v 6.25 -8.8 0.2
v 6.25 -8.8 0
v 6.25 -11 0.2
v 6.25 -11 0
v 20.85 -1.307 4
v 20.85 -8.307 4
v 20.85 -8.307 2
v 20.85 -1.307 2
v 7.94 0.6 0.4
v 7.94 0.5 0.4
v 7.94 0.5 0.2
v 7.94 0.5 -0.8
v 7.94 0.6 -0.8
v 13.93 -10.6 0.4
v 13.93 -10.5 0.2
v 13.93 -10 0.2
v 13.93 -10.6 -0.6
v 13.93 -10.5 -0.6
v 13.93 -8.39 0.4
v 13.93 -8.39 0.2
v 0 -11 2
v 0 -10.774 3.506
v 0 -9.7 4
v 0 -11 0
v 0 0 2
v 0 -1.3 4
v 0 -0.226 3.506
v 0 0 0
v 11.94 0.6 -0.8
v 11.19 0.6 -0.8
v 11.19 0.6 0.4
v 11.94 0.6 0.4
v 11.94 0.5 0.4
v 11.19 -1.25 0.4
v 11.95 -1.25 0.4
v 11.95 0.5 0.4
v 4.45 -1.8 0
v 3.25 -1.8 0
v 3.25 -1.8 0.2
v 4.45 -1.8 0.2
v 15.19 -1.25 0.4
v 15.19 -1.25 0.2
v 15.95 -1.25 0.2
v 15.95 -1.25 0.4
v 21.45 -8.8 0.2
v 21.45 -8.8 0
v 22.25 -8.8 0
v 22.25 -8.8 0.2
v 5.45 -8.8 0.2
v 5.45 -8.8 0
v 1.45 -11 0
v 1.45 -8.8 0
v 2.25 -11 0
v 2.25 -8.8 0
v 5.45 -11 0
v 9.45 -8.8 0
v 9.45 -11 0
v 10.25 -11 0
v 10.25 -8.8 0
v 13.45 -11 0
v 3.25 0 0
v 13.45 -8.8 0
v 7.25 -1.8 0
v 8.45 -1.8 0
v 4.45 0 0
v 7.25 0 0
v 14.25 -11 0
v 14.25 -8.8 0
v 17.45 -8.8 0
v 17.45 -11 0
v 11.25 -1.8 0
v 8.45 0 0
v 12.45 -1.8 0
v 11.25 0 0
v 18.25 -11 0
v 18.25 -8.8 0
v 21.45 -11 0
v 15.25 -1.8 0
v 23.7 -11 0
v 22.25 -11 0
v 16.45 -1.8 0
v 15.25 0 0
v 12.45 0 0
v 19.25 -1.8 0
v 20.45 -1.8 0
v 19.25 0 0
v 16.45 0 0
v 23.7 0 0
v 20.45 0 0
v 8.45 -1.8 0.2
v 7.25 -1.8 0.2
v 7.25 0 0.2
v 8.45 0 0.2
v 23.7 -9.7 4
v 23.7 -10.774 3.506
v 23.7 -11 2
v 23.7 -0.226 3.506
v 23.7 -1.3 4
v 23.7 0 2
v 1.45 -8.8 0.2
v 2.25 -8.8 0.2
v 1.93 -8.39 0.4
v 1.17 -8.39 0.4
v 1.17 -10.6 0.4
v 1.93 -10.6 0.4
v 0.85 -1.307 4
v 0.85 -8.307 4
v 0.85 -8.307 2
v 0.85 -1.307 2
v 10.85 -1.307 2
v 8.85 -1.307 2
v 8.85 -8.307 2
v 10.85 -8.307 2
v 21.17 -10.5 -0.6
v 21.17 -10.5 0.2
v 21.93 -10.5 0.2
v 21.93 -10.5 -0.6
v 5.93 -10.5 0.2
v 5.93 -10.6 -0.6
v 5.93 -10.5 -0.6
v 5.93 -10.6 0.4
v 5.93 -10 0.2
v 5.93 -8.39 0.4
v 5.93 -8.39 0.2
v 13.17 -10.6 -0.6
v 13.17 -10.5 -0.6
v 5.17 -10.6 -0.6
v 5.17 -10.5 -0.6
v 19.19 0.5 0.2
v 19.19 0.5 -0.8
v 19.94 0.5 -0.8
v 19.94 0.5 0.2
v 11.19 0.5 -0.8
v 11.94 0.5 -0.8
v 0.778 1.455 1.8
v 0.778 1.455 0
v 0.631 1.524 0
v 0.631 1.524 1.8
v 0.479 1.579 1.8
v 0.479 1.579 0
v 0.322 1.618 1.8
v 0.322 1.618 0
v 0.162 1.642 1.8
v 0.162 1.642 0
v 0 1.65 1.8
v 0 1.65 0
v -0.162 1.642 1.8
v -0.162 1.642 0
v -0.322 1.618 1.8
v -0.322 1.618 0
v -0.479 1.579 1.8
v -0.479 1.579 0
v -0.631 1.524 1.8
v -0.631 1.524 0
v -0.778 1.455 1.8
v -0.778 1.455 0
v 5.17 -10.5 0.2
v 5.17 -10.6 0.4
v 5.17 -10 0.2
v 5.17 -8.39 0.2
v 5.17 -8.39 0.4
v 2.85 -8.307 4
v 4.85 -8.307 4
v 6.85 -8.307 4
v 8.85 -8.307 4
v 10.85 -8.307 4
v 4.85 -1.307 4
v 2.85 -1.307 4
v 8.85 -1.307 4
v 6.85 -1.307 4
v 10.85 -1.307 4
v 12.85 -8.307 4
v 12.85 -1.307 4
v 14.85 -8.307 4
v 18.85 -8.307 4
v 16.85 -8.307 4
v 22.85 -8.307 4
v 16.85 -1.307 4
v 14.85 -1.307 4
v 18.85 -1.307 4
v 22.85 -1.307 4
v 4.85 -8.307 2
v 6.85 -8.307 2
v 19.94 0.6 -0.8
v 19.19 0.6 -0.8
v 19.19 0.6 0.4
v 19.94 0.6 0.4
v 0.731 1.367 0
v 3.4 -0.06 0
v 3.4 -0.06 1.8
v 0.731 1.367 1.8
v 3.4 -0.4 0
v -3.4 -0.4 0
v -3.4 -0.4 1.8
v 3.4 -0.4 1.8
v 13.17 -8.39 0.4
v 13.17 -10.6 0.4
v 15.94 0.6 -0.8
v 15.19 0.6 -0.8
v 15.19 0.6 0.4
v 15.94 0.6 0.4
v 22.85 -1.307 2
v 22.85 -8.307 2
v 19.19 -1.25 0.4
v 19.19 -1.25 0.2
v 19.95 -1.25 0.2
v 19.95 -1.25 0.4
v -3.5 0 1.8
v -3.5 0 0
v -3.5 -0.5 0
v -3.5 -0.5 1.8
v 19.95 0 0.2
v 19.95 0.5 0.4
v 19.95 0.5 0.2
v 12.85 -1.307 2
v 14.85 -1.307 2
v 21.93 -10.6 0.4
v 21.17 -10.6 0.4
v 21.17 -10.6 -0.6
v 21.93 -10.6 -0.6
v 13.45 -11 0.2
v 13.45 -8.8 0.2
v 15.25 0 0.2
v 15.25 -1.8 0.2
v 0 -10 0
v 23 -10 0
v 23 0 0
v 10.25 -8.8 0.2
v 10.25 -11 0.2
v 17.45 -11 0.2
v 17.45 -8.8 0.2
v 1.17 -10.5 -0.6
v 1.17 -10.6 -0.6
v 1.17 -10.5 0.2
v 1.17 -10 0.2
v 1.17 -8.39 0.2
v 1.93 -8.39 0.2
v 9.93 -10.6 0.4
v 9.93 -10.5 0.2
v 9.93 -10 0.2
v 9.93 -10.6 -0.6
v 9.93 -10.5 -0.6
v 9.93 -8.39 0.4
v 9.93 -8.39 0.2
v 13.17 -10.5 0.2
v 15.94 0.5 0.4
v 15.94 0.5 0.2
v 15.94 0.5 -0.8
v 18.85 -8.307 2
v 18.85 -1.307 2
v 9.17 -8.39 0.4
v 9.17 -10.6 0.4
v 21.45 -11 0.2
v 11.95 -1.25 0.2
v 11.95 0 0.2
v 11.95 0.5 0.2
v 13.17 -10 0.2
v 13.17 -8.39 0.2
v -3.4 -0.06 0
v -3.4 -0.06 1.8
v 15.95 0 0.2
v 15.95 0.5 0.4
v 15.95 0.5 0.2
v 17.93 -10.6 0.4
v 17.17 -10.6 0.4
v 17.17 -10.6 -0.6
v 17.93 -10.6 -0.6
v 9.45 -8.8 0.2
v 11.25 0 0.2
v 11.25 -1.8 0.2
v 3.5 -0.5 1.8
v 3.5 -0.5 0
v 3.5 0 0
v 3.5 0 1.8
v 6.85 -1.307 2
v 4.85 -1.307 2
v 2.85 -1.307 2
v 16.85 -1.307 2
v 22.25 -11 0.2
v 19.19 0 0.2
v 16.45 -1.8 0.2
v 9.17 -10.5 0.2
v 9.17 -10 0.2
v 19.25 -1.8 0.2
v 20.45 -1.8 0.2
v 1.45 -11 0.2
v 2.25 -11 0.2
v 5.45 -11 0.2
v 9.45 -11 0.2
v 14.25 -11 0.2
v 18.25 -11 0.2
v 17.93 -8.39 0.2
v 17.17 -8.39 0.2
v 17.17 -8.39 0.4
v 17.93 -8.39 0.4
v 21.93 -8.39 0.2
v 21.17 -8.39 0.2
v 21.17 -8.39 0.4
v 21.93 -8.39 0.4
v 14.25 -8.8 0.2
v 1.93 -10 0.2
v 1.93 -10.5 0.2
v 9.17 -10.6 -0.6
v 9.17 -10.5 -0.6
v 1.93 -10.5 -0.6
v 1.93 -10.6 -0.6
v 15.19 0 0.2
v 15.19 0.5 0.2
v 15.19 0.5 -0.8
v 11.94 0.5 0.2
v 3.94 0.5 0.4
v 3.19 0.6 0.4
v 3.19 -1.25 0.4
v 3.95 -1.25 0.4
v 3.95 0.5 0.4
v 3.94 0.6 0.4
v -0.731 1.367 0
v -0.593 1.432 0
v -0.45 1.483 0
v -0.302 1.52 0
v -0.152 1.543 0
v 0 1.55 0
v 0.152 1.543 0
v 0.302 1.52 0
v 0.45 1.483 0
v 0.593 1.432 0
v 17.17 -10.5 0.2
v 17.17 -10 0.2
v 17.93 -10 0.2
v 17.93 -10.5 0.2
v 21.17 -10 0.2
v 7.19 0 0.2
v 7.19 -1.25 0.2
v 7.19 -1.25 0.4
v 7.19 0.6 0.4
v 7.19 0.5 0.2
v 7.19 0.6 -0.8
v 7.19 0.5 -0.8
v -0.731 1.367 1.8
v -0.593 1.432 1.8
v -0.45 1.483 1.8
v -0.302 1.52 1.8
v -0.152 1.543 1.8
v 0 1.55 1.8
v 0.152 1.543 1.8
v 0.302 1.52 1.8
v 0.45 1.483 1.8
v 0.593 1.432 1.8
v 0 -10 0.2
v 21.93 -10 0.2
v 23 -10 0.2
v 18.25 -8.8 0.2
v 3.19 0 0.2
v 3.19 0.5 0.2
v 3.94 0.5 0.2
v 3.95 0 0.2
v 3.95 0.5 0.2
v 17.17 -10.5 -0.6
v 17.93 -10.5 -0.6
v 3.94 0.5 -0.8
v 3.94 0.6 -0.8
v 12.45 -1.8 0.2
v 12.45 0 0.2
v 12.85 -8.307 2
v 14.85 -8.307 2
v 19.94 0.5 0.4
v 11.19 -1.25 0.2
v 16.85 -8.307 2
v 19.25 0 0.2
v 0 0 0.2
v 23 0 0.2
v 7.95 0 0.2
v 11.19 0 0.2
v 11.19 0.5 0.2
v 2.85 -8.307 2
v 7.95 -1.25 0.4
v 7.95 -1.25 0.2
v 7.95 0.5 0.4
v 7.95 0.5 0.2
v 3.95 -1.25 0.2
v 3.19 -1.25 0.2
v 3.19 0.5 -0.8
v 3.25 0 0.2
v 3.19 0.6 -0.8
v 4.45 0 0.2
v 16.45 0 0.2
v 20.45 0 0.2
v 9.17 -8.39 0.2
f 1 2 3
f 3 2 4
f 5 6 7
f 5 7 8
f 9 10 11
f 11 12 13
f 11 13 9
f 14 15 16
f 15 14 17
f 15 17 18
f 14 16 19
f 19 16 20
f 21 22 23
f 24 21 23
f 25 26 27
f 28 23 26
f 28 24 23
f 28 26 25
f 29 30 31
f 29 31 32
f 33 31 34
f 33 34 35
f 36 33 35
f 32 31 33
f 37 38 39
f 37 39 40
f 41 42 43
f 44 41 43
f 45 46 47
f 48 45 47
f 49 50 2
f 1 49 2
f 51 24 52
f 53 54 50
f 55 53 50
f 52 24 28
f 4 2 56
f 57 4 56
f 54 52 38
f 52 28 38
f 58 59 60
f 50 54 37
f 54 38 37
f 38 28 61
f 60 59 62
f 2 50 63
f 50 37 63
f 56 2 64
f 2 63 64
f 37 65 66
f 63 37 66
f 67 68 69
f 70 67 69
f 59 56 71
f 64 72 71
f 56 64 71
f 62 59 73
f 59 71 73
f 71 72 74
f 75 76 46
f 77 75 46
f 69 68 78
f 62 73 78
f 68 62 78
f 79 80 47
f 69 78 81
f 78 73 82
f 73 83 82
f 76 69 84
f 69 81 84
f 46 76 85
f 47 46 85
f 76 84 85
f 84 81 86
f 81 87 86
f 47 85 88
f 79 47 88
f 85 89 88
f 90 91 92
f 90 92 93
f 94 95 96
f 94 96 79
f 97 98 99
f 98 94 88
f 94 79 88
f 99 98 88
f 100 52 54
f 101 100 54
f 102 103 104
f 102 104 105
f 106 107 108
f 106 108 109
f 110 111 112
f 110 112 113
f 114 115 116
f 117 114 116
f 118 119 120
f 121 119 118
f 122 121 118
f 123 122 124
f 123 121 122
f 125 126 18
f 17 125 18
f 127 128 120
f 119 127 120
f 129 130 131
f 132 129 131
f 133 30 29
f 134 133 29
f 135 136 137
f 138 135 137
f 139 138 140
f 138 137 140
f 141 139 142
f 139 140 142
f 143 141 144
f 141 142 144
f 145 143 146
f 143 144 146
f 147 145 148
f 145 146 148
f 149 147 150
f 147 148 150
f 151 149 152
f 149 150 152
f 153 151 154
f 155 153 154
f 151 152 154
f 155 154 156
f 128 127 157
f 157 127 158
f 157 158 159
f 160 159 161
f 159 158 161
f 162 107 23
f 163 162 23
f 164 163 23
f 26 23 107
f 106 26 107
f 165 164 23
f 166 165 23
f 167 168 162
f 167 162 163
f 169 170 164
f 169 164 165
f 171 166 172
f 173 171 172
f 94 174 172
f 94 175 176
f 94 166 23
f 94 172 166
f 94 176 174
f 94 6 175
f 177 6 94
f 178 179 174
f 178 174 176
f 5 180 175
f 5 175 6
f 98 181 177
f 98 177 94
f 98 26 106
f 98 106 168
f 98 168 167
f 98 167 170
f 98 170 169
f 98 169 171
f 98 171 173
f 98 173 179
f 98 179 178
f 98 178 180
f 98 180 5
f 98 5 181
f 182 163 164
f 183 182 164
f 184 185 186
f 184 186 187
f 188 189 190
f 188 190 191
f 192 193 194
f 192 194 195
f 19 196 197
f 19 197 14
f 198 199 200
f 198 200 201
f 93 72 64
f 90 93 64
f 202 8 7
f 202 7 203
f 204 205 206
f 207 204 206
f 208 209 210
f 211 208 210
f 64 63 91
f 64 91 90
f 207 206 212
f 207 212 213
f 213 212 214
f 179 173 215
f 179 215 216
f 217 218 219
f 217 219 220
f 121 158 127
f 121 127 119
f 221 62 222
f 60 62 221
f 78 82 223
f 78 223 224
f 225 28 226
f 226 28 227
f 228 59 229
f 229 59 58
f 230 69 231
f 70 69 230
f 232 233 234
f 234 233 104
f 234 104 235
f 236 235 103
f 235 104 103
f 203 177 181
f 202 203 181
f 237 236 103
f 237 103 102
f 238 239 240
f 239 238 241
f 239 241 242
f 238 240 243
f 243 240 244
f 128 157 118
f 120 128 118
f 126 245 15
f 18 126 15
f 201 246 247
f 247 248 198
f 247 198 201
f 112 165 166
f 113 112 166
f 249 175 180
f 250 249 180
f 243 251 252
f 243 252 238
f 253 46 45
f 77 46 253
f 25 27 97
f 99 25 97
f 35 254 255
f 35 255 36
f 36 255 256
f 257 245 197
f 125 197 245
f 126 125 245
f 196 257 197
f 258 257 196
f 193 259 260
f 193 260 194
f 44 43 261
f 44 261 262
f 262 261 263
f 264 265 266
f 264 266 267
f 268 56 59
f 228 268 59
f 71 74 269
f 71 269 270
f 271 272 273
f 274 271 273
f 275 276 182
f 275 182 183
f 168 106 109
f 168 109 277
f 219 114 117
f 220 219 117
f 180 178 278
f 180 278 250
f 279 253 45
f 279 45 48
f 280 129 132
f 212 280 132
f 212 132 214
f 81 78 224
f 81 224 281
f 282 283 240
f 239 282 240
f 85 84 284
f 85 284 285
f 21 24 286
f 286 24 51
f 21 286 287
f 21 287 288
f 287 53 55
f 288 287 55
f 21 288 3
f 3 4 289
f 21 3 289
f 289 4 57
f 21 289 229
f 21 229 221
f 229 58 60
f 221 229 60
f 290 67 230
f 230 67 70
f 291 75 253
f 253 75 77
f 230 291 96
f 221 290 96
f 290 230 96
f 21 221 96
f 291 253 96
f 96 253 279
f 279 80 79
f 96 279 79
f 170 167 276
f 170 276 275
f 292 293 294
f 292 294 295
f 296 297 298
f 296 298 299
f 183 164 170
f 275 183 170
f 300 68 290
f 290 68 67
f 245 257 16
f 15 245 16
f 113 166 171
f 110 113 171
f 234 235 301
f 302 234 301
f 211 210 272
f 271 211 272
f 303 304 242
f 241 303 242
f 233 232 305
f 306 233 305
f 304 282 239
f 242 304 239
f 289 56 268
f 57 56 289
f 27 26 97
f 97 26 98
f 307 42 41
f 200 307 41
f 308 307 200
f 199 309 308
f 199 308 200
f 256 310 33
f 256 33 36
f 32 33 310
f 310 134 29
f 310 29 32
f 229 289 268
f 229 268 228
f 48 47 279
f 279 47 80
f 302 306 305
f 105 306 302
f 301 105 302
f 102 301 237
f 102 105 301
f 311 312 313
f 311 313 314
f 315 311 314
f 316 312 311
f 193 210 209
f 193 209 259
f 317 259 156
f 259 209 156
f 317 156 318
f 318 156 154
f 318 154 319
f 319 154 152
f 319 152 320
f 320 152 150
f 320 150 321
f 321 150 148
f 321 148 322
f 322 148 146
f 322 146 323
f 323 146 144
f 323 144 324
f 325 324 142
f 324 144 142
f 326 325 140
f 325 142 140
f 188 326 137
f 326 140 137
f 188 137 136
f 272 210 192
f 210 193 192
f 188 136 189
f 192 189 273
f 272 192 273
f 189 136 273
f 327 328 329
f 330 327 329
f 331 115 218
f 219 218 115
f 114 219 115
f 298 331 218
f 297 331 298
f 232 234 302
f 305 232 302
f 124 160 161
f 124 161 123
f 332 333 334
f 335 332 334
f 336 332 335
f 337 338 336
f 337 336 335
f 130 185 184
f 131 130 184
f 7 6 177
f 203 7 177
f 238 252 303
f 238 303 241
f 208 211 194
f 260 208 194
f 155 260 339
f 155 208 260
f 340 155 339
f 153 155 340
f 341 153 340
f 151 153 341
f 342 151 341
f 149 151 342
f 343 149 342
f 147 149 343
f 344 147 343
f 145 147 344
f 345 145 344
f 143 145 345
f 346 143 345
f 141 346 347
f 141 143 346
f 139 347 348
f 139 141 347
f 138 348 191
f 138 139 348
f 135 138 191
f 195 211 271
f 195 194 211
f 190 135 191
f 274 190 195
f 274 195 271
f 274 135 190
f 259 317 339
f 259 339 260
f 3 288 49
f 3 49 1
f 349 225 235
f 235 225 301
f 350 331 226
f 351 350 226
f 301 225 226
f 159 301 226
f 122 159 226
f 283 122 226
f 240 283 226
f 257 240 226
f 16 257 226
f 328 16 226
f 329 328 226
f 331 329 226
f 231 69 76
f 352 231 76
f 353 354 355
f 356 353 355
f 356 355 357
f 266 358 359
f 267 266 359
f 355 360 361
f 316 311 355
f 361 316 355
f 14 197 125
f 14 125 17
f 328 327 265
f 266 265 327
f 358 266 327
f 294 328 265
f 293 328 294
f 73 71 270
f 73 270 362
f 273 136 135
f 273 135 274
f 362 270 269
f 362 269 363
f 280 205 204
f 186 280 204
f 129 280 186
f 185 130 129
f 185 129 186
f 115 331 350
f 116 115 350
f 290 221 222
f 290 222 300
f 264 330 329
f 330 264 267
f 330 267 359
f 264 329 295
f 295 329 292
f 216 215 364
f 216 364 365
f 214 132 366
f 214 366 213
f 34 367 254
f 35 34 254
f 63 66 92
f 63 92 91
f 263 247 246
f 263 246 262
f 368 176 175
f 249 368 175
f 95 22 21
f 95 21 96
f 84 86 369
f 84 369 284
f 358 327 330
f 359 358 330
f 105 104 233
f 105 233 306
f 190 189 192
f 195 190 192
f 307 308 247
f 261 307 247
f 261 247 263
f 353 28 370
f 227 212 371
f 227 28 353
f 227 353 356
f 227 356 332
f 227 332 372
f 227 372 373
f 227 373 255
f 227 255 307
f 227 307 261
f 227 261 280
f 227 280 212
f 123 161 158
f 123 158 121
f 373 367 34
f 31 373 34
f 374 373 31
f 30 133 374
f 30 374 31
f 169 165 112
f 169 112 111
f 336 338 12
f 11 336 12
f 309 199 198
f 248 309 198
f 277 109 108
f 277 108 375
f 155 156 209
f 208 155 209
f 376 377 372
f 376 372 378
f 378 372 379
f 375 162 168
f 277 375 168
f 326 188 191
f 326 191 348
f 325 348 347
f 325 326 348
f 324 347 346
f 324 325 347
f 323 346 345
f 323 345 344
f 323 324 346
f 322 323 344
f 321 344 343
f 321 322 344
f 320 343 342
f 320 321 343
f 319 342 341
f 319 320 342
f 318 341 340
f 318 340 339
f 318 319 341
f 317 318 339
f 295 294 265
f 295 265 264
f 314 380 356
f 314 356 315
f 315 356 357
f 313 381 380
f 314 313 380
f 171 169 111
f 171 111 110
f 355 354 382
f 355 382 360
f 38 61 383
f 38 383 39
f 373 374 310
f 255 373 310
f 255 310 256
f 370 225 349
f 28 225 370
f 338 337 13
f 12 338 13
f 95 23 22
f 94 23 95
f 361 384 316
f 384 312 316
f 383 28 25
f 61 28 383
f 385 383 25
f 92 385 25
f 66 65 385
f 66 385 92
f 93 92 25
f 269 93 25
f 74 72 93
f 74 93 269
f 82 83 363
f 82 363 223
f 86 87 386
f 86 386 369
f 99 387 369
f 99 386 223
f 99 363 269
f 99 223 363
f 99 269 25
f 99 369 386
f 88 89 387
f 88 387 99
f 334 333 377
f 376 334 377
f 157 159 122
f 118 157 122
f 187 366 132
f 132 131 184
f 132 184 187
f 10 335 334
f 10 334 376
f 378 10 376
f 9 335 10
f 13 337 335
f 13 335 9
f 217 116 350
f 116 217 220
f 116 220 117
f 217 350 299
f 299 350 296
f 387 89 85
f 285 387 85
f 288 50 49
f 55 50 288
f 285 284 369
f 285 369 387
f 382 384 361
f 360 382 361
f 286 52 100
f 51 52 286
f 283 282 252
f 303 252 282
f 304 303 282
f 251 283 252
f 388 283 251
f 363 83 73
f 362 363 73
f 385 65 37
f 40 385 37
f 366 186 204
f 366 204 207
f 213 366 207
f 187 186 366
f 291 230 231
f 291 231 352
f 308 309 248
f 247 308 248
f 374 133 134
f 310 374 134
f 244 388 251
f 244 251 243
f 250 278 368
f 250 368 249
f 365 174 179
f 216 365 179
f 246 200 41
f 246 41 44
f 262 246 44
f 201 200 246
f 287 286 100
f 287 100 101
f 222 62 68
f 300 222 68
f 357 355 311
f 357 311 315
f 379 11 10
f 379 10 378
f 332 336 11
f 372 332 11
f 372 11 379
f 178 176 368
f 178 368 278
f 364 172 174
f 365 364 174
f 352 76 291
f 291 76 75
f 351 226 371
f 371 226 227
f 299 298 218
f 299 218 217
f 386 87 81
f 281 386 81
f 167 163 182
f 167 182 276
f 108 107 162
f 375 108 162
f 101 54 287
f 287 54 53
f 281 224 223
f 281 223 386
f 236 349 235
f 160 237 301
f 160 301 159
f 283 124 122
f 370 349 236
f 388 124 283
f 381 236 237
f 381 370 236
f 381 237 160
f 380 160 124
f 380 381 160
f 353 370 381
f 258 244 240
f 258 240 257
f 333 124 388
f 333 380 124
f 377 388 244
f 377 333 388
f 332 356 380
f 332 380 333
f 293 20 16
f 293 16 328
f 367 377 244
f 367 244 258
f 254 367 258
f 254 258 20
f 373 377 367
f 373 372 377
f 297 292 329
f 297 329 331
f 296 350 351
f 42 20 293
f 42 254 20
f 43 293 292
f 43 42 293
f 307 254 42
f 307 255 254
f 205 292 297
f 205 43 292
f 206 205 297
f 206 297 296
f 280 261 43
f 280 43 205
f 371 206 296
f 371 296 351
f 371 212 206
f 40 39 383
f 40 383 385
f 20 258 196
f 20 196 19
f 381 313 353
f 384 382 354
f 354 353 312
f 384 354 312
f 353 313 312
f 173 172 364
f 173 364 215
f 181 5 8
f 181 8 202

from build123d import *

# Parameters (mm, degrees)
SKETCH_W               = 23.7
SKETCH_H               = 11
PAD_DEPTH              = 4
CHAMFER_1_SIZE2        = 0.3
CHAMFER_1_SIZE         = 2
CHAMFER_2_SIZE2        = 0.3
CHAMFER_2_SIZE         = 2
CHAMFER001_1_SIZE2     = 1
CHAMFER001_1_SIZE      = 0.5
CHAMFER001_2_SIZE2     = 1
CHAMFER001_2_SIZE      = 0.5
SKETCH001_W            = 2
SKETCH001_H            = 7
POCKET_DEPTH           = 2
LINEARPATTERN_COUNT    = 6
LINEARPATTERN_PITCH    = 4
SKETCH002_W            = 0.8
SKETCH002_H            = 2.2
POCKET001_DEPTH        = 0.2
LINEARPATTERN001_COUNT = 6
LINEARPATTERN001_PITCH = 4
SKETCH003_W            = 1.2
SKETCH003_H            = 1.8
POCKET002_DEPTH        = 0.2
LINEARPATTERN002_COUNT = 5
LINEARPATTERN002_PITCH = 4
PAD001_DEPTH           = 1.8
SKETCH005_W            = 23
SKETCH005_H            = 10
PAD002_DEPTH           = 0.2
SKETCH006_W            = 0.76
SKETCH006_H            = 2.11
PAD003_DEPTH           = 0.2
LINEARPATTERN003_COUNT = 6
LINEARPATTERN003_PITCH = 4
SKETCH007_W            = 0.76
SKETCH007_H            = 1.75
PAD004_DEPTH           = 0.2
LINEARPATTERN004_COUNT = 5
LINEARPATTERN004_PITCH = 4
SKETCH008_W            = 0.75
SKETCH008_H            = 0.1
PAD005_DEPTH           = 0.2
PAD005_DEPTH_BACK      = 1
LINEARPATTERN005_COUNT = 5
LINEARPATTERN005_PITCH = 4
SKETCH009_W            = 0.76
SKETCH009_H            = 0.1
PAD006_DEPTH           = 1
LINEARPATTERN006_COUNT = 6
LINEARPATTERN006_PITCH = 4


with BuildPart() as body:
    # Sketch → Pad (new body)
    with BuildSketch(Plane.XY):
        with Locations((11.85, -5.5)):
            Rectangle(SKETCH_W, SKETCH_H)
    extrude(amount=PAD_DEPTH)

    # Chamfer 1
    chamfer_1_edges = [body.edges().sort_by_distance(p)[0] for p in [
        (11.85, -11, 4),
    ]]
    chamfer_1_side = body.faces().sort_by_distance((11.85, -11, 2))[0]
    chamfer(chamfer_1_edges, length=CHAMFER_1_SIZE, length2=CHAMFER_1_SIZE2, reference=chamfer_1_side)

    # Chamfer 2
    chamfer_2_edges = [body.edges().sort_by_distance(p)[0] for p in [
        (11.85, 0, 4),
    ]]
    chamfer_2_side = body.faces().sort_by_distance((11.85, 0, 2))[0]
    chamfer(chamfer_2_edges, length=CHAMFER_2_SIZE, length2=CHAMFER_2_SIZE2, reference=chamfer_2_side)

    # Chamfer001 1
    chamfer001_1_edges = [body.edges().sort_by_distance(p)[0] for p in [
        (11.85, -10.7, 4),
    ]]
    chamfer001_1_side = body.faces().sort_by_distance((11.85, -10.85, 3))[0]
    chamfer(chamfer001_1_edges, length=CHAMFER001_1_SIZE, length2=CHAMFER001_1_SIZE2, reference=chamfer001_1_side)

    # Chamfer001 2
    chamfer001_2_edges = [body.edges().sort_by_distance(p)[0] for p in [
        (11.85, -0.3, 4),
    ]]
    chamfer001_2_side = body.faces().sort_by_distance((11.85, -0.15, 3))[0]
    chamfer(chamfer001_2_edges, length=CHAMFER001_2_SIZE, length2=CHAMFER001_2_SIZE2, reference=chamfer001_2_side)

    # Sketch001 (on Face5 of Chamfer001) → Pocket (cut)
    with BuildSketch(Plane.XY.offset(4)):
        with Locations((1.85, -4.807466)):
            Rectangle(SKETCH001_W, SKETCH001_H)
    pocket = extrude(amount=-POCKET_DEPTH, mode=Mode.SUBTRACT)

    # LinearPattern: Pocket ×6
    with Locations(*[(i * LINEARPATTERN_PITCH, 0, 0) for i in range(1, LINEARPATTERN_COUNT)]):
        add(pocket, mode=Mode.SUBTRACT)

    # Sketch002 (on Face6 of LinearPattern) → Pocket001 (cut)
    with BuildSketch(Plane(origin=(0, 0, 0), x_dir=(1, 0, 0), z_dir=(0, 0, -1))):
        with Locations((1.85, 9.9)):
            Rectangle(SKETCH002_W, SKETCH002_H)
    pocket001 = extrude(amount=-POCKET001_DEPTH, mode=Mode.SUBTRACT)

    # LinearPattern001: Pocket001 ×6
    with Locations(*[(i * LINEARPATTERN001_PITCH, 0, 0) for i in range(1, LINEARPATTERN001_COUNT)]):
        add(pocket001, mode=Mode.SUBTRACT)

    # Sketch003 (on Face6 of LinearPattern001) → Pocket002 (cut)
    with BuildSketch(Plane(origin=(0, 0, 0), x_dir=(1, 0, 0), z_dir=(0, 0, -1))):
        with Locations((3.85, 0.9)):
            Rectangle(SKETCH003_W, SKETCH003_H)
    pocket002 = extrude(amount=-POCKET002_DEPTH, mode=Mode.SUBTRACT)

    # LinearPattern002: Pocket002 ×5
    with Locations(*[(i * LINEARPATTERN002_PITCH, 0, 0) for i in range(1, LINEARPATTERN002_COUNT)]):
        add(pocket002, mode=Mode.SUBTRACT)


with BuildPart() as body001:
    # Sketch004 → Pad001 (new body)
    with BuildSketch(Plane.XY):
        with BuildLine():
            ThreePointArc((0.777857, 1.455142), (0, 1.65), (-0.777857, 1.455142))
            Line((-0.777857, 1.455142), (-3.5, 0))
            Line((-3.5, 0), (-3.5, -0.5))
            Line((-3.5, -0.5), (3.5, -0.5))
            Line((3.5, -0.5), (3.5, 0))
            Line((0.777857, 1.455142), (3.5, 0))
        make_face()
        with BuildLine():
            Line((-0.730725, 1.366946), (-3.4, -0.059935))
            Line((-3.4, -0.059935), (-3.4, -0.4))
            Line((-3.4, -0.4), (3.4, -0.4))
            Line((3.4, -0.059935), (3.4, -0.4))
            Line((3.4, -0.059935), (0.730714, 1.366952))
            ThreePointArc((0.730714, 1.366952), (-6e-06, 1.55), (-0.730725, 1.366946))
        make_face(mode=Mode.SUBTRACT)
    extrude(amount=PAD001_DEPTH)


with BuildPart() as body002:
    # Sketch005 → Pad002 (new body)
    with BuildSketch(Plane.XY):
        with Locations((11.5, -5)):
            Rectangle(SKETCH005_W, SKETCH005_H)
    extrude(amount=PAD002_DEPTH)

    # Sketch006 (on Face6 of Pad002) → Pad003 (join)
    with BuildSketch(Plane.XY.offset(0.2)):
        with Locations((1.55, -9.445)):
            Rectangle(SKETCH006_W, SKETCH006_H)
    pad003 = extrude(amount=PAD003_DEPTH)

    # LinearPattern003: Pad003 ×6
    with Locations(*[(i * LINEARPATTERN003_PITCH, 0, 0) for i in range(1, LINEARPATTERN003_COUNT)]):
        add(pad003)

    # Sketch007 (on Face5 of LinearPattern003) → Pad004 (join)
    with BuildSketch(Plane.XY.offset(0.2)):
        with Locations((3.57, -0.375)):
            Rectangle(SKETCH007_W, SKETCH007_H)
    pad004 = extrude(amount=PAD004_DEPTH)

    # LinearPattern004: Pad004 ×5
    with Locations(*[(i * LINEARPATTERN004_PITCH, 0, 0) for i in range(1, LINEARPATTERN004_COUNT)]):
        add(pad004)

    # Sketch008 (on Face5 of LinearPattern004) → Pad005 (join, two sides)
    with BuildSketch(Plane.XY.offset(0.2)) as pad005_sk:
        with Locations((3.565, 0.55)):
            Rectangle(SKETCH008_W, SKETCH008_H)
    pad005 = extrude(amount=PAD005_DEPTH) + extrude(pad005_sk.sketch, amount=-PAD005_DEPTH_BACK)

    # LinearPattern005: Pad005 ×5
    with Locations(*[(i * LINEARPATTERN005_PITCH, 0, 0) for i in range(1, LINEARPATTERN005_COUNT)]):
        add(pad005)

    # Sketch009 (on Face62 of LinearPattern005) → Pad006 (join)
    with BuildSketch(Plane.XY.offset(0.4)):
        with Locations((1.55, -10.55)):
            Rectangle(SKETCH009_W, SKETCH009_H)
    pad006 = extrude(amount=-PAD006_DEPTH)

    # LinearPattern006: Pad006 ×6
    with Locations(*[(i * LINEARPATTERN006_PITCH, 0, 0) for i in range(1, LINEARPATTERN006_COUNT)]):
        add(pad006)


solid = Compound([body.part, body001.part, body002.part])
